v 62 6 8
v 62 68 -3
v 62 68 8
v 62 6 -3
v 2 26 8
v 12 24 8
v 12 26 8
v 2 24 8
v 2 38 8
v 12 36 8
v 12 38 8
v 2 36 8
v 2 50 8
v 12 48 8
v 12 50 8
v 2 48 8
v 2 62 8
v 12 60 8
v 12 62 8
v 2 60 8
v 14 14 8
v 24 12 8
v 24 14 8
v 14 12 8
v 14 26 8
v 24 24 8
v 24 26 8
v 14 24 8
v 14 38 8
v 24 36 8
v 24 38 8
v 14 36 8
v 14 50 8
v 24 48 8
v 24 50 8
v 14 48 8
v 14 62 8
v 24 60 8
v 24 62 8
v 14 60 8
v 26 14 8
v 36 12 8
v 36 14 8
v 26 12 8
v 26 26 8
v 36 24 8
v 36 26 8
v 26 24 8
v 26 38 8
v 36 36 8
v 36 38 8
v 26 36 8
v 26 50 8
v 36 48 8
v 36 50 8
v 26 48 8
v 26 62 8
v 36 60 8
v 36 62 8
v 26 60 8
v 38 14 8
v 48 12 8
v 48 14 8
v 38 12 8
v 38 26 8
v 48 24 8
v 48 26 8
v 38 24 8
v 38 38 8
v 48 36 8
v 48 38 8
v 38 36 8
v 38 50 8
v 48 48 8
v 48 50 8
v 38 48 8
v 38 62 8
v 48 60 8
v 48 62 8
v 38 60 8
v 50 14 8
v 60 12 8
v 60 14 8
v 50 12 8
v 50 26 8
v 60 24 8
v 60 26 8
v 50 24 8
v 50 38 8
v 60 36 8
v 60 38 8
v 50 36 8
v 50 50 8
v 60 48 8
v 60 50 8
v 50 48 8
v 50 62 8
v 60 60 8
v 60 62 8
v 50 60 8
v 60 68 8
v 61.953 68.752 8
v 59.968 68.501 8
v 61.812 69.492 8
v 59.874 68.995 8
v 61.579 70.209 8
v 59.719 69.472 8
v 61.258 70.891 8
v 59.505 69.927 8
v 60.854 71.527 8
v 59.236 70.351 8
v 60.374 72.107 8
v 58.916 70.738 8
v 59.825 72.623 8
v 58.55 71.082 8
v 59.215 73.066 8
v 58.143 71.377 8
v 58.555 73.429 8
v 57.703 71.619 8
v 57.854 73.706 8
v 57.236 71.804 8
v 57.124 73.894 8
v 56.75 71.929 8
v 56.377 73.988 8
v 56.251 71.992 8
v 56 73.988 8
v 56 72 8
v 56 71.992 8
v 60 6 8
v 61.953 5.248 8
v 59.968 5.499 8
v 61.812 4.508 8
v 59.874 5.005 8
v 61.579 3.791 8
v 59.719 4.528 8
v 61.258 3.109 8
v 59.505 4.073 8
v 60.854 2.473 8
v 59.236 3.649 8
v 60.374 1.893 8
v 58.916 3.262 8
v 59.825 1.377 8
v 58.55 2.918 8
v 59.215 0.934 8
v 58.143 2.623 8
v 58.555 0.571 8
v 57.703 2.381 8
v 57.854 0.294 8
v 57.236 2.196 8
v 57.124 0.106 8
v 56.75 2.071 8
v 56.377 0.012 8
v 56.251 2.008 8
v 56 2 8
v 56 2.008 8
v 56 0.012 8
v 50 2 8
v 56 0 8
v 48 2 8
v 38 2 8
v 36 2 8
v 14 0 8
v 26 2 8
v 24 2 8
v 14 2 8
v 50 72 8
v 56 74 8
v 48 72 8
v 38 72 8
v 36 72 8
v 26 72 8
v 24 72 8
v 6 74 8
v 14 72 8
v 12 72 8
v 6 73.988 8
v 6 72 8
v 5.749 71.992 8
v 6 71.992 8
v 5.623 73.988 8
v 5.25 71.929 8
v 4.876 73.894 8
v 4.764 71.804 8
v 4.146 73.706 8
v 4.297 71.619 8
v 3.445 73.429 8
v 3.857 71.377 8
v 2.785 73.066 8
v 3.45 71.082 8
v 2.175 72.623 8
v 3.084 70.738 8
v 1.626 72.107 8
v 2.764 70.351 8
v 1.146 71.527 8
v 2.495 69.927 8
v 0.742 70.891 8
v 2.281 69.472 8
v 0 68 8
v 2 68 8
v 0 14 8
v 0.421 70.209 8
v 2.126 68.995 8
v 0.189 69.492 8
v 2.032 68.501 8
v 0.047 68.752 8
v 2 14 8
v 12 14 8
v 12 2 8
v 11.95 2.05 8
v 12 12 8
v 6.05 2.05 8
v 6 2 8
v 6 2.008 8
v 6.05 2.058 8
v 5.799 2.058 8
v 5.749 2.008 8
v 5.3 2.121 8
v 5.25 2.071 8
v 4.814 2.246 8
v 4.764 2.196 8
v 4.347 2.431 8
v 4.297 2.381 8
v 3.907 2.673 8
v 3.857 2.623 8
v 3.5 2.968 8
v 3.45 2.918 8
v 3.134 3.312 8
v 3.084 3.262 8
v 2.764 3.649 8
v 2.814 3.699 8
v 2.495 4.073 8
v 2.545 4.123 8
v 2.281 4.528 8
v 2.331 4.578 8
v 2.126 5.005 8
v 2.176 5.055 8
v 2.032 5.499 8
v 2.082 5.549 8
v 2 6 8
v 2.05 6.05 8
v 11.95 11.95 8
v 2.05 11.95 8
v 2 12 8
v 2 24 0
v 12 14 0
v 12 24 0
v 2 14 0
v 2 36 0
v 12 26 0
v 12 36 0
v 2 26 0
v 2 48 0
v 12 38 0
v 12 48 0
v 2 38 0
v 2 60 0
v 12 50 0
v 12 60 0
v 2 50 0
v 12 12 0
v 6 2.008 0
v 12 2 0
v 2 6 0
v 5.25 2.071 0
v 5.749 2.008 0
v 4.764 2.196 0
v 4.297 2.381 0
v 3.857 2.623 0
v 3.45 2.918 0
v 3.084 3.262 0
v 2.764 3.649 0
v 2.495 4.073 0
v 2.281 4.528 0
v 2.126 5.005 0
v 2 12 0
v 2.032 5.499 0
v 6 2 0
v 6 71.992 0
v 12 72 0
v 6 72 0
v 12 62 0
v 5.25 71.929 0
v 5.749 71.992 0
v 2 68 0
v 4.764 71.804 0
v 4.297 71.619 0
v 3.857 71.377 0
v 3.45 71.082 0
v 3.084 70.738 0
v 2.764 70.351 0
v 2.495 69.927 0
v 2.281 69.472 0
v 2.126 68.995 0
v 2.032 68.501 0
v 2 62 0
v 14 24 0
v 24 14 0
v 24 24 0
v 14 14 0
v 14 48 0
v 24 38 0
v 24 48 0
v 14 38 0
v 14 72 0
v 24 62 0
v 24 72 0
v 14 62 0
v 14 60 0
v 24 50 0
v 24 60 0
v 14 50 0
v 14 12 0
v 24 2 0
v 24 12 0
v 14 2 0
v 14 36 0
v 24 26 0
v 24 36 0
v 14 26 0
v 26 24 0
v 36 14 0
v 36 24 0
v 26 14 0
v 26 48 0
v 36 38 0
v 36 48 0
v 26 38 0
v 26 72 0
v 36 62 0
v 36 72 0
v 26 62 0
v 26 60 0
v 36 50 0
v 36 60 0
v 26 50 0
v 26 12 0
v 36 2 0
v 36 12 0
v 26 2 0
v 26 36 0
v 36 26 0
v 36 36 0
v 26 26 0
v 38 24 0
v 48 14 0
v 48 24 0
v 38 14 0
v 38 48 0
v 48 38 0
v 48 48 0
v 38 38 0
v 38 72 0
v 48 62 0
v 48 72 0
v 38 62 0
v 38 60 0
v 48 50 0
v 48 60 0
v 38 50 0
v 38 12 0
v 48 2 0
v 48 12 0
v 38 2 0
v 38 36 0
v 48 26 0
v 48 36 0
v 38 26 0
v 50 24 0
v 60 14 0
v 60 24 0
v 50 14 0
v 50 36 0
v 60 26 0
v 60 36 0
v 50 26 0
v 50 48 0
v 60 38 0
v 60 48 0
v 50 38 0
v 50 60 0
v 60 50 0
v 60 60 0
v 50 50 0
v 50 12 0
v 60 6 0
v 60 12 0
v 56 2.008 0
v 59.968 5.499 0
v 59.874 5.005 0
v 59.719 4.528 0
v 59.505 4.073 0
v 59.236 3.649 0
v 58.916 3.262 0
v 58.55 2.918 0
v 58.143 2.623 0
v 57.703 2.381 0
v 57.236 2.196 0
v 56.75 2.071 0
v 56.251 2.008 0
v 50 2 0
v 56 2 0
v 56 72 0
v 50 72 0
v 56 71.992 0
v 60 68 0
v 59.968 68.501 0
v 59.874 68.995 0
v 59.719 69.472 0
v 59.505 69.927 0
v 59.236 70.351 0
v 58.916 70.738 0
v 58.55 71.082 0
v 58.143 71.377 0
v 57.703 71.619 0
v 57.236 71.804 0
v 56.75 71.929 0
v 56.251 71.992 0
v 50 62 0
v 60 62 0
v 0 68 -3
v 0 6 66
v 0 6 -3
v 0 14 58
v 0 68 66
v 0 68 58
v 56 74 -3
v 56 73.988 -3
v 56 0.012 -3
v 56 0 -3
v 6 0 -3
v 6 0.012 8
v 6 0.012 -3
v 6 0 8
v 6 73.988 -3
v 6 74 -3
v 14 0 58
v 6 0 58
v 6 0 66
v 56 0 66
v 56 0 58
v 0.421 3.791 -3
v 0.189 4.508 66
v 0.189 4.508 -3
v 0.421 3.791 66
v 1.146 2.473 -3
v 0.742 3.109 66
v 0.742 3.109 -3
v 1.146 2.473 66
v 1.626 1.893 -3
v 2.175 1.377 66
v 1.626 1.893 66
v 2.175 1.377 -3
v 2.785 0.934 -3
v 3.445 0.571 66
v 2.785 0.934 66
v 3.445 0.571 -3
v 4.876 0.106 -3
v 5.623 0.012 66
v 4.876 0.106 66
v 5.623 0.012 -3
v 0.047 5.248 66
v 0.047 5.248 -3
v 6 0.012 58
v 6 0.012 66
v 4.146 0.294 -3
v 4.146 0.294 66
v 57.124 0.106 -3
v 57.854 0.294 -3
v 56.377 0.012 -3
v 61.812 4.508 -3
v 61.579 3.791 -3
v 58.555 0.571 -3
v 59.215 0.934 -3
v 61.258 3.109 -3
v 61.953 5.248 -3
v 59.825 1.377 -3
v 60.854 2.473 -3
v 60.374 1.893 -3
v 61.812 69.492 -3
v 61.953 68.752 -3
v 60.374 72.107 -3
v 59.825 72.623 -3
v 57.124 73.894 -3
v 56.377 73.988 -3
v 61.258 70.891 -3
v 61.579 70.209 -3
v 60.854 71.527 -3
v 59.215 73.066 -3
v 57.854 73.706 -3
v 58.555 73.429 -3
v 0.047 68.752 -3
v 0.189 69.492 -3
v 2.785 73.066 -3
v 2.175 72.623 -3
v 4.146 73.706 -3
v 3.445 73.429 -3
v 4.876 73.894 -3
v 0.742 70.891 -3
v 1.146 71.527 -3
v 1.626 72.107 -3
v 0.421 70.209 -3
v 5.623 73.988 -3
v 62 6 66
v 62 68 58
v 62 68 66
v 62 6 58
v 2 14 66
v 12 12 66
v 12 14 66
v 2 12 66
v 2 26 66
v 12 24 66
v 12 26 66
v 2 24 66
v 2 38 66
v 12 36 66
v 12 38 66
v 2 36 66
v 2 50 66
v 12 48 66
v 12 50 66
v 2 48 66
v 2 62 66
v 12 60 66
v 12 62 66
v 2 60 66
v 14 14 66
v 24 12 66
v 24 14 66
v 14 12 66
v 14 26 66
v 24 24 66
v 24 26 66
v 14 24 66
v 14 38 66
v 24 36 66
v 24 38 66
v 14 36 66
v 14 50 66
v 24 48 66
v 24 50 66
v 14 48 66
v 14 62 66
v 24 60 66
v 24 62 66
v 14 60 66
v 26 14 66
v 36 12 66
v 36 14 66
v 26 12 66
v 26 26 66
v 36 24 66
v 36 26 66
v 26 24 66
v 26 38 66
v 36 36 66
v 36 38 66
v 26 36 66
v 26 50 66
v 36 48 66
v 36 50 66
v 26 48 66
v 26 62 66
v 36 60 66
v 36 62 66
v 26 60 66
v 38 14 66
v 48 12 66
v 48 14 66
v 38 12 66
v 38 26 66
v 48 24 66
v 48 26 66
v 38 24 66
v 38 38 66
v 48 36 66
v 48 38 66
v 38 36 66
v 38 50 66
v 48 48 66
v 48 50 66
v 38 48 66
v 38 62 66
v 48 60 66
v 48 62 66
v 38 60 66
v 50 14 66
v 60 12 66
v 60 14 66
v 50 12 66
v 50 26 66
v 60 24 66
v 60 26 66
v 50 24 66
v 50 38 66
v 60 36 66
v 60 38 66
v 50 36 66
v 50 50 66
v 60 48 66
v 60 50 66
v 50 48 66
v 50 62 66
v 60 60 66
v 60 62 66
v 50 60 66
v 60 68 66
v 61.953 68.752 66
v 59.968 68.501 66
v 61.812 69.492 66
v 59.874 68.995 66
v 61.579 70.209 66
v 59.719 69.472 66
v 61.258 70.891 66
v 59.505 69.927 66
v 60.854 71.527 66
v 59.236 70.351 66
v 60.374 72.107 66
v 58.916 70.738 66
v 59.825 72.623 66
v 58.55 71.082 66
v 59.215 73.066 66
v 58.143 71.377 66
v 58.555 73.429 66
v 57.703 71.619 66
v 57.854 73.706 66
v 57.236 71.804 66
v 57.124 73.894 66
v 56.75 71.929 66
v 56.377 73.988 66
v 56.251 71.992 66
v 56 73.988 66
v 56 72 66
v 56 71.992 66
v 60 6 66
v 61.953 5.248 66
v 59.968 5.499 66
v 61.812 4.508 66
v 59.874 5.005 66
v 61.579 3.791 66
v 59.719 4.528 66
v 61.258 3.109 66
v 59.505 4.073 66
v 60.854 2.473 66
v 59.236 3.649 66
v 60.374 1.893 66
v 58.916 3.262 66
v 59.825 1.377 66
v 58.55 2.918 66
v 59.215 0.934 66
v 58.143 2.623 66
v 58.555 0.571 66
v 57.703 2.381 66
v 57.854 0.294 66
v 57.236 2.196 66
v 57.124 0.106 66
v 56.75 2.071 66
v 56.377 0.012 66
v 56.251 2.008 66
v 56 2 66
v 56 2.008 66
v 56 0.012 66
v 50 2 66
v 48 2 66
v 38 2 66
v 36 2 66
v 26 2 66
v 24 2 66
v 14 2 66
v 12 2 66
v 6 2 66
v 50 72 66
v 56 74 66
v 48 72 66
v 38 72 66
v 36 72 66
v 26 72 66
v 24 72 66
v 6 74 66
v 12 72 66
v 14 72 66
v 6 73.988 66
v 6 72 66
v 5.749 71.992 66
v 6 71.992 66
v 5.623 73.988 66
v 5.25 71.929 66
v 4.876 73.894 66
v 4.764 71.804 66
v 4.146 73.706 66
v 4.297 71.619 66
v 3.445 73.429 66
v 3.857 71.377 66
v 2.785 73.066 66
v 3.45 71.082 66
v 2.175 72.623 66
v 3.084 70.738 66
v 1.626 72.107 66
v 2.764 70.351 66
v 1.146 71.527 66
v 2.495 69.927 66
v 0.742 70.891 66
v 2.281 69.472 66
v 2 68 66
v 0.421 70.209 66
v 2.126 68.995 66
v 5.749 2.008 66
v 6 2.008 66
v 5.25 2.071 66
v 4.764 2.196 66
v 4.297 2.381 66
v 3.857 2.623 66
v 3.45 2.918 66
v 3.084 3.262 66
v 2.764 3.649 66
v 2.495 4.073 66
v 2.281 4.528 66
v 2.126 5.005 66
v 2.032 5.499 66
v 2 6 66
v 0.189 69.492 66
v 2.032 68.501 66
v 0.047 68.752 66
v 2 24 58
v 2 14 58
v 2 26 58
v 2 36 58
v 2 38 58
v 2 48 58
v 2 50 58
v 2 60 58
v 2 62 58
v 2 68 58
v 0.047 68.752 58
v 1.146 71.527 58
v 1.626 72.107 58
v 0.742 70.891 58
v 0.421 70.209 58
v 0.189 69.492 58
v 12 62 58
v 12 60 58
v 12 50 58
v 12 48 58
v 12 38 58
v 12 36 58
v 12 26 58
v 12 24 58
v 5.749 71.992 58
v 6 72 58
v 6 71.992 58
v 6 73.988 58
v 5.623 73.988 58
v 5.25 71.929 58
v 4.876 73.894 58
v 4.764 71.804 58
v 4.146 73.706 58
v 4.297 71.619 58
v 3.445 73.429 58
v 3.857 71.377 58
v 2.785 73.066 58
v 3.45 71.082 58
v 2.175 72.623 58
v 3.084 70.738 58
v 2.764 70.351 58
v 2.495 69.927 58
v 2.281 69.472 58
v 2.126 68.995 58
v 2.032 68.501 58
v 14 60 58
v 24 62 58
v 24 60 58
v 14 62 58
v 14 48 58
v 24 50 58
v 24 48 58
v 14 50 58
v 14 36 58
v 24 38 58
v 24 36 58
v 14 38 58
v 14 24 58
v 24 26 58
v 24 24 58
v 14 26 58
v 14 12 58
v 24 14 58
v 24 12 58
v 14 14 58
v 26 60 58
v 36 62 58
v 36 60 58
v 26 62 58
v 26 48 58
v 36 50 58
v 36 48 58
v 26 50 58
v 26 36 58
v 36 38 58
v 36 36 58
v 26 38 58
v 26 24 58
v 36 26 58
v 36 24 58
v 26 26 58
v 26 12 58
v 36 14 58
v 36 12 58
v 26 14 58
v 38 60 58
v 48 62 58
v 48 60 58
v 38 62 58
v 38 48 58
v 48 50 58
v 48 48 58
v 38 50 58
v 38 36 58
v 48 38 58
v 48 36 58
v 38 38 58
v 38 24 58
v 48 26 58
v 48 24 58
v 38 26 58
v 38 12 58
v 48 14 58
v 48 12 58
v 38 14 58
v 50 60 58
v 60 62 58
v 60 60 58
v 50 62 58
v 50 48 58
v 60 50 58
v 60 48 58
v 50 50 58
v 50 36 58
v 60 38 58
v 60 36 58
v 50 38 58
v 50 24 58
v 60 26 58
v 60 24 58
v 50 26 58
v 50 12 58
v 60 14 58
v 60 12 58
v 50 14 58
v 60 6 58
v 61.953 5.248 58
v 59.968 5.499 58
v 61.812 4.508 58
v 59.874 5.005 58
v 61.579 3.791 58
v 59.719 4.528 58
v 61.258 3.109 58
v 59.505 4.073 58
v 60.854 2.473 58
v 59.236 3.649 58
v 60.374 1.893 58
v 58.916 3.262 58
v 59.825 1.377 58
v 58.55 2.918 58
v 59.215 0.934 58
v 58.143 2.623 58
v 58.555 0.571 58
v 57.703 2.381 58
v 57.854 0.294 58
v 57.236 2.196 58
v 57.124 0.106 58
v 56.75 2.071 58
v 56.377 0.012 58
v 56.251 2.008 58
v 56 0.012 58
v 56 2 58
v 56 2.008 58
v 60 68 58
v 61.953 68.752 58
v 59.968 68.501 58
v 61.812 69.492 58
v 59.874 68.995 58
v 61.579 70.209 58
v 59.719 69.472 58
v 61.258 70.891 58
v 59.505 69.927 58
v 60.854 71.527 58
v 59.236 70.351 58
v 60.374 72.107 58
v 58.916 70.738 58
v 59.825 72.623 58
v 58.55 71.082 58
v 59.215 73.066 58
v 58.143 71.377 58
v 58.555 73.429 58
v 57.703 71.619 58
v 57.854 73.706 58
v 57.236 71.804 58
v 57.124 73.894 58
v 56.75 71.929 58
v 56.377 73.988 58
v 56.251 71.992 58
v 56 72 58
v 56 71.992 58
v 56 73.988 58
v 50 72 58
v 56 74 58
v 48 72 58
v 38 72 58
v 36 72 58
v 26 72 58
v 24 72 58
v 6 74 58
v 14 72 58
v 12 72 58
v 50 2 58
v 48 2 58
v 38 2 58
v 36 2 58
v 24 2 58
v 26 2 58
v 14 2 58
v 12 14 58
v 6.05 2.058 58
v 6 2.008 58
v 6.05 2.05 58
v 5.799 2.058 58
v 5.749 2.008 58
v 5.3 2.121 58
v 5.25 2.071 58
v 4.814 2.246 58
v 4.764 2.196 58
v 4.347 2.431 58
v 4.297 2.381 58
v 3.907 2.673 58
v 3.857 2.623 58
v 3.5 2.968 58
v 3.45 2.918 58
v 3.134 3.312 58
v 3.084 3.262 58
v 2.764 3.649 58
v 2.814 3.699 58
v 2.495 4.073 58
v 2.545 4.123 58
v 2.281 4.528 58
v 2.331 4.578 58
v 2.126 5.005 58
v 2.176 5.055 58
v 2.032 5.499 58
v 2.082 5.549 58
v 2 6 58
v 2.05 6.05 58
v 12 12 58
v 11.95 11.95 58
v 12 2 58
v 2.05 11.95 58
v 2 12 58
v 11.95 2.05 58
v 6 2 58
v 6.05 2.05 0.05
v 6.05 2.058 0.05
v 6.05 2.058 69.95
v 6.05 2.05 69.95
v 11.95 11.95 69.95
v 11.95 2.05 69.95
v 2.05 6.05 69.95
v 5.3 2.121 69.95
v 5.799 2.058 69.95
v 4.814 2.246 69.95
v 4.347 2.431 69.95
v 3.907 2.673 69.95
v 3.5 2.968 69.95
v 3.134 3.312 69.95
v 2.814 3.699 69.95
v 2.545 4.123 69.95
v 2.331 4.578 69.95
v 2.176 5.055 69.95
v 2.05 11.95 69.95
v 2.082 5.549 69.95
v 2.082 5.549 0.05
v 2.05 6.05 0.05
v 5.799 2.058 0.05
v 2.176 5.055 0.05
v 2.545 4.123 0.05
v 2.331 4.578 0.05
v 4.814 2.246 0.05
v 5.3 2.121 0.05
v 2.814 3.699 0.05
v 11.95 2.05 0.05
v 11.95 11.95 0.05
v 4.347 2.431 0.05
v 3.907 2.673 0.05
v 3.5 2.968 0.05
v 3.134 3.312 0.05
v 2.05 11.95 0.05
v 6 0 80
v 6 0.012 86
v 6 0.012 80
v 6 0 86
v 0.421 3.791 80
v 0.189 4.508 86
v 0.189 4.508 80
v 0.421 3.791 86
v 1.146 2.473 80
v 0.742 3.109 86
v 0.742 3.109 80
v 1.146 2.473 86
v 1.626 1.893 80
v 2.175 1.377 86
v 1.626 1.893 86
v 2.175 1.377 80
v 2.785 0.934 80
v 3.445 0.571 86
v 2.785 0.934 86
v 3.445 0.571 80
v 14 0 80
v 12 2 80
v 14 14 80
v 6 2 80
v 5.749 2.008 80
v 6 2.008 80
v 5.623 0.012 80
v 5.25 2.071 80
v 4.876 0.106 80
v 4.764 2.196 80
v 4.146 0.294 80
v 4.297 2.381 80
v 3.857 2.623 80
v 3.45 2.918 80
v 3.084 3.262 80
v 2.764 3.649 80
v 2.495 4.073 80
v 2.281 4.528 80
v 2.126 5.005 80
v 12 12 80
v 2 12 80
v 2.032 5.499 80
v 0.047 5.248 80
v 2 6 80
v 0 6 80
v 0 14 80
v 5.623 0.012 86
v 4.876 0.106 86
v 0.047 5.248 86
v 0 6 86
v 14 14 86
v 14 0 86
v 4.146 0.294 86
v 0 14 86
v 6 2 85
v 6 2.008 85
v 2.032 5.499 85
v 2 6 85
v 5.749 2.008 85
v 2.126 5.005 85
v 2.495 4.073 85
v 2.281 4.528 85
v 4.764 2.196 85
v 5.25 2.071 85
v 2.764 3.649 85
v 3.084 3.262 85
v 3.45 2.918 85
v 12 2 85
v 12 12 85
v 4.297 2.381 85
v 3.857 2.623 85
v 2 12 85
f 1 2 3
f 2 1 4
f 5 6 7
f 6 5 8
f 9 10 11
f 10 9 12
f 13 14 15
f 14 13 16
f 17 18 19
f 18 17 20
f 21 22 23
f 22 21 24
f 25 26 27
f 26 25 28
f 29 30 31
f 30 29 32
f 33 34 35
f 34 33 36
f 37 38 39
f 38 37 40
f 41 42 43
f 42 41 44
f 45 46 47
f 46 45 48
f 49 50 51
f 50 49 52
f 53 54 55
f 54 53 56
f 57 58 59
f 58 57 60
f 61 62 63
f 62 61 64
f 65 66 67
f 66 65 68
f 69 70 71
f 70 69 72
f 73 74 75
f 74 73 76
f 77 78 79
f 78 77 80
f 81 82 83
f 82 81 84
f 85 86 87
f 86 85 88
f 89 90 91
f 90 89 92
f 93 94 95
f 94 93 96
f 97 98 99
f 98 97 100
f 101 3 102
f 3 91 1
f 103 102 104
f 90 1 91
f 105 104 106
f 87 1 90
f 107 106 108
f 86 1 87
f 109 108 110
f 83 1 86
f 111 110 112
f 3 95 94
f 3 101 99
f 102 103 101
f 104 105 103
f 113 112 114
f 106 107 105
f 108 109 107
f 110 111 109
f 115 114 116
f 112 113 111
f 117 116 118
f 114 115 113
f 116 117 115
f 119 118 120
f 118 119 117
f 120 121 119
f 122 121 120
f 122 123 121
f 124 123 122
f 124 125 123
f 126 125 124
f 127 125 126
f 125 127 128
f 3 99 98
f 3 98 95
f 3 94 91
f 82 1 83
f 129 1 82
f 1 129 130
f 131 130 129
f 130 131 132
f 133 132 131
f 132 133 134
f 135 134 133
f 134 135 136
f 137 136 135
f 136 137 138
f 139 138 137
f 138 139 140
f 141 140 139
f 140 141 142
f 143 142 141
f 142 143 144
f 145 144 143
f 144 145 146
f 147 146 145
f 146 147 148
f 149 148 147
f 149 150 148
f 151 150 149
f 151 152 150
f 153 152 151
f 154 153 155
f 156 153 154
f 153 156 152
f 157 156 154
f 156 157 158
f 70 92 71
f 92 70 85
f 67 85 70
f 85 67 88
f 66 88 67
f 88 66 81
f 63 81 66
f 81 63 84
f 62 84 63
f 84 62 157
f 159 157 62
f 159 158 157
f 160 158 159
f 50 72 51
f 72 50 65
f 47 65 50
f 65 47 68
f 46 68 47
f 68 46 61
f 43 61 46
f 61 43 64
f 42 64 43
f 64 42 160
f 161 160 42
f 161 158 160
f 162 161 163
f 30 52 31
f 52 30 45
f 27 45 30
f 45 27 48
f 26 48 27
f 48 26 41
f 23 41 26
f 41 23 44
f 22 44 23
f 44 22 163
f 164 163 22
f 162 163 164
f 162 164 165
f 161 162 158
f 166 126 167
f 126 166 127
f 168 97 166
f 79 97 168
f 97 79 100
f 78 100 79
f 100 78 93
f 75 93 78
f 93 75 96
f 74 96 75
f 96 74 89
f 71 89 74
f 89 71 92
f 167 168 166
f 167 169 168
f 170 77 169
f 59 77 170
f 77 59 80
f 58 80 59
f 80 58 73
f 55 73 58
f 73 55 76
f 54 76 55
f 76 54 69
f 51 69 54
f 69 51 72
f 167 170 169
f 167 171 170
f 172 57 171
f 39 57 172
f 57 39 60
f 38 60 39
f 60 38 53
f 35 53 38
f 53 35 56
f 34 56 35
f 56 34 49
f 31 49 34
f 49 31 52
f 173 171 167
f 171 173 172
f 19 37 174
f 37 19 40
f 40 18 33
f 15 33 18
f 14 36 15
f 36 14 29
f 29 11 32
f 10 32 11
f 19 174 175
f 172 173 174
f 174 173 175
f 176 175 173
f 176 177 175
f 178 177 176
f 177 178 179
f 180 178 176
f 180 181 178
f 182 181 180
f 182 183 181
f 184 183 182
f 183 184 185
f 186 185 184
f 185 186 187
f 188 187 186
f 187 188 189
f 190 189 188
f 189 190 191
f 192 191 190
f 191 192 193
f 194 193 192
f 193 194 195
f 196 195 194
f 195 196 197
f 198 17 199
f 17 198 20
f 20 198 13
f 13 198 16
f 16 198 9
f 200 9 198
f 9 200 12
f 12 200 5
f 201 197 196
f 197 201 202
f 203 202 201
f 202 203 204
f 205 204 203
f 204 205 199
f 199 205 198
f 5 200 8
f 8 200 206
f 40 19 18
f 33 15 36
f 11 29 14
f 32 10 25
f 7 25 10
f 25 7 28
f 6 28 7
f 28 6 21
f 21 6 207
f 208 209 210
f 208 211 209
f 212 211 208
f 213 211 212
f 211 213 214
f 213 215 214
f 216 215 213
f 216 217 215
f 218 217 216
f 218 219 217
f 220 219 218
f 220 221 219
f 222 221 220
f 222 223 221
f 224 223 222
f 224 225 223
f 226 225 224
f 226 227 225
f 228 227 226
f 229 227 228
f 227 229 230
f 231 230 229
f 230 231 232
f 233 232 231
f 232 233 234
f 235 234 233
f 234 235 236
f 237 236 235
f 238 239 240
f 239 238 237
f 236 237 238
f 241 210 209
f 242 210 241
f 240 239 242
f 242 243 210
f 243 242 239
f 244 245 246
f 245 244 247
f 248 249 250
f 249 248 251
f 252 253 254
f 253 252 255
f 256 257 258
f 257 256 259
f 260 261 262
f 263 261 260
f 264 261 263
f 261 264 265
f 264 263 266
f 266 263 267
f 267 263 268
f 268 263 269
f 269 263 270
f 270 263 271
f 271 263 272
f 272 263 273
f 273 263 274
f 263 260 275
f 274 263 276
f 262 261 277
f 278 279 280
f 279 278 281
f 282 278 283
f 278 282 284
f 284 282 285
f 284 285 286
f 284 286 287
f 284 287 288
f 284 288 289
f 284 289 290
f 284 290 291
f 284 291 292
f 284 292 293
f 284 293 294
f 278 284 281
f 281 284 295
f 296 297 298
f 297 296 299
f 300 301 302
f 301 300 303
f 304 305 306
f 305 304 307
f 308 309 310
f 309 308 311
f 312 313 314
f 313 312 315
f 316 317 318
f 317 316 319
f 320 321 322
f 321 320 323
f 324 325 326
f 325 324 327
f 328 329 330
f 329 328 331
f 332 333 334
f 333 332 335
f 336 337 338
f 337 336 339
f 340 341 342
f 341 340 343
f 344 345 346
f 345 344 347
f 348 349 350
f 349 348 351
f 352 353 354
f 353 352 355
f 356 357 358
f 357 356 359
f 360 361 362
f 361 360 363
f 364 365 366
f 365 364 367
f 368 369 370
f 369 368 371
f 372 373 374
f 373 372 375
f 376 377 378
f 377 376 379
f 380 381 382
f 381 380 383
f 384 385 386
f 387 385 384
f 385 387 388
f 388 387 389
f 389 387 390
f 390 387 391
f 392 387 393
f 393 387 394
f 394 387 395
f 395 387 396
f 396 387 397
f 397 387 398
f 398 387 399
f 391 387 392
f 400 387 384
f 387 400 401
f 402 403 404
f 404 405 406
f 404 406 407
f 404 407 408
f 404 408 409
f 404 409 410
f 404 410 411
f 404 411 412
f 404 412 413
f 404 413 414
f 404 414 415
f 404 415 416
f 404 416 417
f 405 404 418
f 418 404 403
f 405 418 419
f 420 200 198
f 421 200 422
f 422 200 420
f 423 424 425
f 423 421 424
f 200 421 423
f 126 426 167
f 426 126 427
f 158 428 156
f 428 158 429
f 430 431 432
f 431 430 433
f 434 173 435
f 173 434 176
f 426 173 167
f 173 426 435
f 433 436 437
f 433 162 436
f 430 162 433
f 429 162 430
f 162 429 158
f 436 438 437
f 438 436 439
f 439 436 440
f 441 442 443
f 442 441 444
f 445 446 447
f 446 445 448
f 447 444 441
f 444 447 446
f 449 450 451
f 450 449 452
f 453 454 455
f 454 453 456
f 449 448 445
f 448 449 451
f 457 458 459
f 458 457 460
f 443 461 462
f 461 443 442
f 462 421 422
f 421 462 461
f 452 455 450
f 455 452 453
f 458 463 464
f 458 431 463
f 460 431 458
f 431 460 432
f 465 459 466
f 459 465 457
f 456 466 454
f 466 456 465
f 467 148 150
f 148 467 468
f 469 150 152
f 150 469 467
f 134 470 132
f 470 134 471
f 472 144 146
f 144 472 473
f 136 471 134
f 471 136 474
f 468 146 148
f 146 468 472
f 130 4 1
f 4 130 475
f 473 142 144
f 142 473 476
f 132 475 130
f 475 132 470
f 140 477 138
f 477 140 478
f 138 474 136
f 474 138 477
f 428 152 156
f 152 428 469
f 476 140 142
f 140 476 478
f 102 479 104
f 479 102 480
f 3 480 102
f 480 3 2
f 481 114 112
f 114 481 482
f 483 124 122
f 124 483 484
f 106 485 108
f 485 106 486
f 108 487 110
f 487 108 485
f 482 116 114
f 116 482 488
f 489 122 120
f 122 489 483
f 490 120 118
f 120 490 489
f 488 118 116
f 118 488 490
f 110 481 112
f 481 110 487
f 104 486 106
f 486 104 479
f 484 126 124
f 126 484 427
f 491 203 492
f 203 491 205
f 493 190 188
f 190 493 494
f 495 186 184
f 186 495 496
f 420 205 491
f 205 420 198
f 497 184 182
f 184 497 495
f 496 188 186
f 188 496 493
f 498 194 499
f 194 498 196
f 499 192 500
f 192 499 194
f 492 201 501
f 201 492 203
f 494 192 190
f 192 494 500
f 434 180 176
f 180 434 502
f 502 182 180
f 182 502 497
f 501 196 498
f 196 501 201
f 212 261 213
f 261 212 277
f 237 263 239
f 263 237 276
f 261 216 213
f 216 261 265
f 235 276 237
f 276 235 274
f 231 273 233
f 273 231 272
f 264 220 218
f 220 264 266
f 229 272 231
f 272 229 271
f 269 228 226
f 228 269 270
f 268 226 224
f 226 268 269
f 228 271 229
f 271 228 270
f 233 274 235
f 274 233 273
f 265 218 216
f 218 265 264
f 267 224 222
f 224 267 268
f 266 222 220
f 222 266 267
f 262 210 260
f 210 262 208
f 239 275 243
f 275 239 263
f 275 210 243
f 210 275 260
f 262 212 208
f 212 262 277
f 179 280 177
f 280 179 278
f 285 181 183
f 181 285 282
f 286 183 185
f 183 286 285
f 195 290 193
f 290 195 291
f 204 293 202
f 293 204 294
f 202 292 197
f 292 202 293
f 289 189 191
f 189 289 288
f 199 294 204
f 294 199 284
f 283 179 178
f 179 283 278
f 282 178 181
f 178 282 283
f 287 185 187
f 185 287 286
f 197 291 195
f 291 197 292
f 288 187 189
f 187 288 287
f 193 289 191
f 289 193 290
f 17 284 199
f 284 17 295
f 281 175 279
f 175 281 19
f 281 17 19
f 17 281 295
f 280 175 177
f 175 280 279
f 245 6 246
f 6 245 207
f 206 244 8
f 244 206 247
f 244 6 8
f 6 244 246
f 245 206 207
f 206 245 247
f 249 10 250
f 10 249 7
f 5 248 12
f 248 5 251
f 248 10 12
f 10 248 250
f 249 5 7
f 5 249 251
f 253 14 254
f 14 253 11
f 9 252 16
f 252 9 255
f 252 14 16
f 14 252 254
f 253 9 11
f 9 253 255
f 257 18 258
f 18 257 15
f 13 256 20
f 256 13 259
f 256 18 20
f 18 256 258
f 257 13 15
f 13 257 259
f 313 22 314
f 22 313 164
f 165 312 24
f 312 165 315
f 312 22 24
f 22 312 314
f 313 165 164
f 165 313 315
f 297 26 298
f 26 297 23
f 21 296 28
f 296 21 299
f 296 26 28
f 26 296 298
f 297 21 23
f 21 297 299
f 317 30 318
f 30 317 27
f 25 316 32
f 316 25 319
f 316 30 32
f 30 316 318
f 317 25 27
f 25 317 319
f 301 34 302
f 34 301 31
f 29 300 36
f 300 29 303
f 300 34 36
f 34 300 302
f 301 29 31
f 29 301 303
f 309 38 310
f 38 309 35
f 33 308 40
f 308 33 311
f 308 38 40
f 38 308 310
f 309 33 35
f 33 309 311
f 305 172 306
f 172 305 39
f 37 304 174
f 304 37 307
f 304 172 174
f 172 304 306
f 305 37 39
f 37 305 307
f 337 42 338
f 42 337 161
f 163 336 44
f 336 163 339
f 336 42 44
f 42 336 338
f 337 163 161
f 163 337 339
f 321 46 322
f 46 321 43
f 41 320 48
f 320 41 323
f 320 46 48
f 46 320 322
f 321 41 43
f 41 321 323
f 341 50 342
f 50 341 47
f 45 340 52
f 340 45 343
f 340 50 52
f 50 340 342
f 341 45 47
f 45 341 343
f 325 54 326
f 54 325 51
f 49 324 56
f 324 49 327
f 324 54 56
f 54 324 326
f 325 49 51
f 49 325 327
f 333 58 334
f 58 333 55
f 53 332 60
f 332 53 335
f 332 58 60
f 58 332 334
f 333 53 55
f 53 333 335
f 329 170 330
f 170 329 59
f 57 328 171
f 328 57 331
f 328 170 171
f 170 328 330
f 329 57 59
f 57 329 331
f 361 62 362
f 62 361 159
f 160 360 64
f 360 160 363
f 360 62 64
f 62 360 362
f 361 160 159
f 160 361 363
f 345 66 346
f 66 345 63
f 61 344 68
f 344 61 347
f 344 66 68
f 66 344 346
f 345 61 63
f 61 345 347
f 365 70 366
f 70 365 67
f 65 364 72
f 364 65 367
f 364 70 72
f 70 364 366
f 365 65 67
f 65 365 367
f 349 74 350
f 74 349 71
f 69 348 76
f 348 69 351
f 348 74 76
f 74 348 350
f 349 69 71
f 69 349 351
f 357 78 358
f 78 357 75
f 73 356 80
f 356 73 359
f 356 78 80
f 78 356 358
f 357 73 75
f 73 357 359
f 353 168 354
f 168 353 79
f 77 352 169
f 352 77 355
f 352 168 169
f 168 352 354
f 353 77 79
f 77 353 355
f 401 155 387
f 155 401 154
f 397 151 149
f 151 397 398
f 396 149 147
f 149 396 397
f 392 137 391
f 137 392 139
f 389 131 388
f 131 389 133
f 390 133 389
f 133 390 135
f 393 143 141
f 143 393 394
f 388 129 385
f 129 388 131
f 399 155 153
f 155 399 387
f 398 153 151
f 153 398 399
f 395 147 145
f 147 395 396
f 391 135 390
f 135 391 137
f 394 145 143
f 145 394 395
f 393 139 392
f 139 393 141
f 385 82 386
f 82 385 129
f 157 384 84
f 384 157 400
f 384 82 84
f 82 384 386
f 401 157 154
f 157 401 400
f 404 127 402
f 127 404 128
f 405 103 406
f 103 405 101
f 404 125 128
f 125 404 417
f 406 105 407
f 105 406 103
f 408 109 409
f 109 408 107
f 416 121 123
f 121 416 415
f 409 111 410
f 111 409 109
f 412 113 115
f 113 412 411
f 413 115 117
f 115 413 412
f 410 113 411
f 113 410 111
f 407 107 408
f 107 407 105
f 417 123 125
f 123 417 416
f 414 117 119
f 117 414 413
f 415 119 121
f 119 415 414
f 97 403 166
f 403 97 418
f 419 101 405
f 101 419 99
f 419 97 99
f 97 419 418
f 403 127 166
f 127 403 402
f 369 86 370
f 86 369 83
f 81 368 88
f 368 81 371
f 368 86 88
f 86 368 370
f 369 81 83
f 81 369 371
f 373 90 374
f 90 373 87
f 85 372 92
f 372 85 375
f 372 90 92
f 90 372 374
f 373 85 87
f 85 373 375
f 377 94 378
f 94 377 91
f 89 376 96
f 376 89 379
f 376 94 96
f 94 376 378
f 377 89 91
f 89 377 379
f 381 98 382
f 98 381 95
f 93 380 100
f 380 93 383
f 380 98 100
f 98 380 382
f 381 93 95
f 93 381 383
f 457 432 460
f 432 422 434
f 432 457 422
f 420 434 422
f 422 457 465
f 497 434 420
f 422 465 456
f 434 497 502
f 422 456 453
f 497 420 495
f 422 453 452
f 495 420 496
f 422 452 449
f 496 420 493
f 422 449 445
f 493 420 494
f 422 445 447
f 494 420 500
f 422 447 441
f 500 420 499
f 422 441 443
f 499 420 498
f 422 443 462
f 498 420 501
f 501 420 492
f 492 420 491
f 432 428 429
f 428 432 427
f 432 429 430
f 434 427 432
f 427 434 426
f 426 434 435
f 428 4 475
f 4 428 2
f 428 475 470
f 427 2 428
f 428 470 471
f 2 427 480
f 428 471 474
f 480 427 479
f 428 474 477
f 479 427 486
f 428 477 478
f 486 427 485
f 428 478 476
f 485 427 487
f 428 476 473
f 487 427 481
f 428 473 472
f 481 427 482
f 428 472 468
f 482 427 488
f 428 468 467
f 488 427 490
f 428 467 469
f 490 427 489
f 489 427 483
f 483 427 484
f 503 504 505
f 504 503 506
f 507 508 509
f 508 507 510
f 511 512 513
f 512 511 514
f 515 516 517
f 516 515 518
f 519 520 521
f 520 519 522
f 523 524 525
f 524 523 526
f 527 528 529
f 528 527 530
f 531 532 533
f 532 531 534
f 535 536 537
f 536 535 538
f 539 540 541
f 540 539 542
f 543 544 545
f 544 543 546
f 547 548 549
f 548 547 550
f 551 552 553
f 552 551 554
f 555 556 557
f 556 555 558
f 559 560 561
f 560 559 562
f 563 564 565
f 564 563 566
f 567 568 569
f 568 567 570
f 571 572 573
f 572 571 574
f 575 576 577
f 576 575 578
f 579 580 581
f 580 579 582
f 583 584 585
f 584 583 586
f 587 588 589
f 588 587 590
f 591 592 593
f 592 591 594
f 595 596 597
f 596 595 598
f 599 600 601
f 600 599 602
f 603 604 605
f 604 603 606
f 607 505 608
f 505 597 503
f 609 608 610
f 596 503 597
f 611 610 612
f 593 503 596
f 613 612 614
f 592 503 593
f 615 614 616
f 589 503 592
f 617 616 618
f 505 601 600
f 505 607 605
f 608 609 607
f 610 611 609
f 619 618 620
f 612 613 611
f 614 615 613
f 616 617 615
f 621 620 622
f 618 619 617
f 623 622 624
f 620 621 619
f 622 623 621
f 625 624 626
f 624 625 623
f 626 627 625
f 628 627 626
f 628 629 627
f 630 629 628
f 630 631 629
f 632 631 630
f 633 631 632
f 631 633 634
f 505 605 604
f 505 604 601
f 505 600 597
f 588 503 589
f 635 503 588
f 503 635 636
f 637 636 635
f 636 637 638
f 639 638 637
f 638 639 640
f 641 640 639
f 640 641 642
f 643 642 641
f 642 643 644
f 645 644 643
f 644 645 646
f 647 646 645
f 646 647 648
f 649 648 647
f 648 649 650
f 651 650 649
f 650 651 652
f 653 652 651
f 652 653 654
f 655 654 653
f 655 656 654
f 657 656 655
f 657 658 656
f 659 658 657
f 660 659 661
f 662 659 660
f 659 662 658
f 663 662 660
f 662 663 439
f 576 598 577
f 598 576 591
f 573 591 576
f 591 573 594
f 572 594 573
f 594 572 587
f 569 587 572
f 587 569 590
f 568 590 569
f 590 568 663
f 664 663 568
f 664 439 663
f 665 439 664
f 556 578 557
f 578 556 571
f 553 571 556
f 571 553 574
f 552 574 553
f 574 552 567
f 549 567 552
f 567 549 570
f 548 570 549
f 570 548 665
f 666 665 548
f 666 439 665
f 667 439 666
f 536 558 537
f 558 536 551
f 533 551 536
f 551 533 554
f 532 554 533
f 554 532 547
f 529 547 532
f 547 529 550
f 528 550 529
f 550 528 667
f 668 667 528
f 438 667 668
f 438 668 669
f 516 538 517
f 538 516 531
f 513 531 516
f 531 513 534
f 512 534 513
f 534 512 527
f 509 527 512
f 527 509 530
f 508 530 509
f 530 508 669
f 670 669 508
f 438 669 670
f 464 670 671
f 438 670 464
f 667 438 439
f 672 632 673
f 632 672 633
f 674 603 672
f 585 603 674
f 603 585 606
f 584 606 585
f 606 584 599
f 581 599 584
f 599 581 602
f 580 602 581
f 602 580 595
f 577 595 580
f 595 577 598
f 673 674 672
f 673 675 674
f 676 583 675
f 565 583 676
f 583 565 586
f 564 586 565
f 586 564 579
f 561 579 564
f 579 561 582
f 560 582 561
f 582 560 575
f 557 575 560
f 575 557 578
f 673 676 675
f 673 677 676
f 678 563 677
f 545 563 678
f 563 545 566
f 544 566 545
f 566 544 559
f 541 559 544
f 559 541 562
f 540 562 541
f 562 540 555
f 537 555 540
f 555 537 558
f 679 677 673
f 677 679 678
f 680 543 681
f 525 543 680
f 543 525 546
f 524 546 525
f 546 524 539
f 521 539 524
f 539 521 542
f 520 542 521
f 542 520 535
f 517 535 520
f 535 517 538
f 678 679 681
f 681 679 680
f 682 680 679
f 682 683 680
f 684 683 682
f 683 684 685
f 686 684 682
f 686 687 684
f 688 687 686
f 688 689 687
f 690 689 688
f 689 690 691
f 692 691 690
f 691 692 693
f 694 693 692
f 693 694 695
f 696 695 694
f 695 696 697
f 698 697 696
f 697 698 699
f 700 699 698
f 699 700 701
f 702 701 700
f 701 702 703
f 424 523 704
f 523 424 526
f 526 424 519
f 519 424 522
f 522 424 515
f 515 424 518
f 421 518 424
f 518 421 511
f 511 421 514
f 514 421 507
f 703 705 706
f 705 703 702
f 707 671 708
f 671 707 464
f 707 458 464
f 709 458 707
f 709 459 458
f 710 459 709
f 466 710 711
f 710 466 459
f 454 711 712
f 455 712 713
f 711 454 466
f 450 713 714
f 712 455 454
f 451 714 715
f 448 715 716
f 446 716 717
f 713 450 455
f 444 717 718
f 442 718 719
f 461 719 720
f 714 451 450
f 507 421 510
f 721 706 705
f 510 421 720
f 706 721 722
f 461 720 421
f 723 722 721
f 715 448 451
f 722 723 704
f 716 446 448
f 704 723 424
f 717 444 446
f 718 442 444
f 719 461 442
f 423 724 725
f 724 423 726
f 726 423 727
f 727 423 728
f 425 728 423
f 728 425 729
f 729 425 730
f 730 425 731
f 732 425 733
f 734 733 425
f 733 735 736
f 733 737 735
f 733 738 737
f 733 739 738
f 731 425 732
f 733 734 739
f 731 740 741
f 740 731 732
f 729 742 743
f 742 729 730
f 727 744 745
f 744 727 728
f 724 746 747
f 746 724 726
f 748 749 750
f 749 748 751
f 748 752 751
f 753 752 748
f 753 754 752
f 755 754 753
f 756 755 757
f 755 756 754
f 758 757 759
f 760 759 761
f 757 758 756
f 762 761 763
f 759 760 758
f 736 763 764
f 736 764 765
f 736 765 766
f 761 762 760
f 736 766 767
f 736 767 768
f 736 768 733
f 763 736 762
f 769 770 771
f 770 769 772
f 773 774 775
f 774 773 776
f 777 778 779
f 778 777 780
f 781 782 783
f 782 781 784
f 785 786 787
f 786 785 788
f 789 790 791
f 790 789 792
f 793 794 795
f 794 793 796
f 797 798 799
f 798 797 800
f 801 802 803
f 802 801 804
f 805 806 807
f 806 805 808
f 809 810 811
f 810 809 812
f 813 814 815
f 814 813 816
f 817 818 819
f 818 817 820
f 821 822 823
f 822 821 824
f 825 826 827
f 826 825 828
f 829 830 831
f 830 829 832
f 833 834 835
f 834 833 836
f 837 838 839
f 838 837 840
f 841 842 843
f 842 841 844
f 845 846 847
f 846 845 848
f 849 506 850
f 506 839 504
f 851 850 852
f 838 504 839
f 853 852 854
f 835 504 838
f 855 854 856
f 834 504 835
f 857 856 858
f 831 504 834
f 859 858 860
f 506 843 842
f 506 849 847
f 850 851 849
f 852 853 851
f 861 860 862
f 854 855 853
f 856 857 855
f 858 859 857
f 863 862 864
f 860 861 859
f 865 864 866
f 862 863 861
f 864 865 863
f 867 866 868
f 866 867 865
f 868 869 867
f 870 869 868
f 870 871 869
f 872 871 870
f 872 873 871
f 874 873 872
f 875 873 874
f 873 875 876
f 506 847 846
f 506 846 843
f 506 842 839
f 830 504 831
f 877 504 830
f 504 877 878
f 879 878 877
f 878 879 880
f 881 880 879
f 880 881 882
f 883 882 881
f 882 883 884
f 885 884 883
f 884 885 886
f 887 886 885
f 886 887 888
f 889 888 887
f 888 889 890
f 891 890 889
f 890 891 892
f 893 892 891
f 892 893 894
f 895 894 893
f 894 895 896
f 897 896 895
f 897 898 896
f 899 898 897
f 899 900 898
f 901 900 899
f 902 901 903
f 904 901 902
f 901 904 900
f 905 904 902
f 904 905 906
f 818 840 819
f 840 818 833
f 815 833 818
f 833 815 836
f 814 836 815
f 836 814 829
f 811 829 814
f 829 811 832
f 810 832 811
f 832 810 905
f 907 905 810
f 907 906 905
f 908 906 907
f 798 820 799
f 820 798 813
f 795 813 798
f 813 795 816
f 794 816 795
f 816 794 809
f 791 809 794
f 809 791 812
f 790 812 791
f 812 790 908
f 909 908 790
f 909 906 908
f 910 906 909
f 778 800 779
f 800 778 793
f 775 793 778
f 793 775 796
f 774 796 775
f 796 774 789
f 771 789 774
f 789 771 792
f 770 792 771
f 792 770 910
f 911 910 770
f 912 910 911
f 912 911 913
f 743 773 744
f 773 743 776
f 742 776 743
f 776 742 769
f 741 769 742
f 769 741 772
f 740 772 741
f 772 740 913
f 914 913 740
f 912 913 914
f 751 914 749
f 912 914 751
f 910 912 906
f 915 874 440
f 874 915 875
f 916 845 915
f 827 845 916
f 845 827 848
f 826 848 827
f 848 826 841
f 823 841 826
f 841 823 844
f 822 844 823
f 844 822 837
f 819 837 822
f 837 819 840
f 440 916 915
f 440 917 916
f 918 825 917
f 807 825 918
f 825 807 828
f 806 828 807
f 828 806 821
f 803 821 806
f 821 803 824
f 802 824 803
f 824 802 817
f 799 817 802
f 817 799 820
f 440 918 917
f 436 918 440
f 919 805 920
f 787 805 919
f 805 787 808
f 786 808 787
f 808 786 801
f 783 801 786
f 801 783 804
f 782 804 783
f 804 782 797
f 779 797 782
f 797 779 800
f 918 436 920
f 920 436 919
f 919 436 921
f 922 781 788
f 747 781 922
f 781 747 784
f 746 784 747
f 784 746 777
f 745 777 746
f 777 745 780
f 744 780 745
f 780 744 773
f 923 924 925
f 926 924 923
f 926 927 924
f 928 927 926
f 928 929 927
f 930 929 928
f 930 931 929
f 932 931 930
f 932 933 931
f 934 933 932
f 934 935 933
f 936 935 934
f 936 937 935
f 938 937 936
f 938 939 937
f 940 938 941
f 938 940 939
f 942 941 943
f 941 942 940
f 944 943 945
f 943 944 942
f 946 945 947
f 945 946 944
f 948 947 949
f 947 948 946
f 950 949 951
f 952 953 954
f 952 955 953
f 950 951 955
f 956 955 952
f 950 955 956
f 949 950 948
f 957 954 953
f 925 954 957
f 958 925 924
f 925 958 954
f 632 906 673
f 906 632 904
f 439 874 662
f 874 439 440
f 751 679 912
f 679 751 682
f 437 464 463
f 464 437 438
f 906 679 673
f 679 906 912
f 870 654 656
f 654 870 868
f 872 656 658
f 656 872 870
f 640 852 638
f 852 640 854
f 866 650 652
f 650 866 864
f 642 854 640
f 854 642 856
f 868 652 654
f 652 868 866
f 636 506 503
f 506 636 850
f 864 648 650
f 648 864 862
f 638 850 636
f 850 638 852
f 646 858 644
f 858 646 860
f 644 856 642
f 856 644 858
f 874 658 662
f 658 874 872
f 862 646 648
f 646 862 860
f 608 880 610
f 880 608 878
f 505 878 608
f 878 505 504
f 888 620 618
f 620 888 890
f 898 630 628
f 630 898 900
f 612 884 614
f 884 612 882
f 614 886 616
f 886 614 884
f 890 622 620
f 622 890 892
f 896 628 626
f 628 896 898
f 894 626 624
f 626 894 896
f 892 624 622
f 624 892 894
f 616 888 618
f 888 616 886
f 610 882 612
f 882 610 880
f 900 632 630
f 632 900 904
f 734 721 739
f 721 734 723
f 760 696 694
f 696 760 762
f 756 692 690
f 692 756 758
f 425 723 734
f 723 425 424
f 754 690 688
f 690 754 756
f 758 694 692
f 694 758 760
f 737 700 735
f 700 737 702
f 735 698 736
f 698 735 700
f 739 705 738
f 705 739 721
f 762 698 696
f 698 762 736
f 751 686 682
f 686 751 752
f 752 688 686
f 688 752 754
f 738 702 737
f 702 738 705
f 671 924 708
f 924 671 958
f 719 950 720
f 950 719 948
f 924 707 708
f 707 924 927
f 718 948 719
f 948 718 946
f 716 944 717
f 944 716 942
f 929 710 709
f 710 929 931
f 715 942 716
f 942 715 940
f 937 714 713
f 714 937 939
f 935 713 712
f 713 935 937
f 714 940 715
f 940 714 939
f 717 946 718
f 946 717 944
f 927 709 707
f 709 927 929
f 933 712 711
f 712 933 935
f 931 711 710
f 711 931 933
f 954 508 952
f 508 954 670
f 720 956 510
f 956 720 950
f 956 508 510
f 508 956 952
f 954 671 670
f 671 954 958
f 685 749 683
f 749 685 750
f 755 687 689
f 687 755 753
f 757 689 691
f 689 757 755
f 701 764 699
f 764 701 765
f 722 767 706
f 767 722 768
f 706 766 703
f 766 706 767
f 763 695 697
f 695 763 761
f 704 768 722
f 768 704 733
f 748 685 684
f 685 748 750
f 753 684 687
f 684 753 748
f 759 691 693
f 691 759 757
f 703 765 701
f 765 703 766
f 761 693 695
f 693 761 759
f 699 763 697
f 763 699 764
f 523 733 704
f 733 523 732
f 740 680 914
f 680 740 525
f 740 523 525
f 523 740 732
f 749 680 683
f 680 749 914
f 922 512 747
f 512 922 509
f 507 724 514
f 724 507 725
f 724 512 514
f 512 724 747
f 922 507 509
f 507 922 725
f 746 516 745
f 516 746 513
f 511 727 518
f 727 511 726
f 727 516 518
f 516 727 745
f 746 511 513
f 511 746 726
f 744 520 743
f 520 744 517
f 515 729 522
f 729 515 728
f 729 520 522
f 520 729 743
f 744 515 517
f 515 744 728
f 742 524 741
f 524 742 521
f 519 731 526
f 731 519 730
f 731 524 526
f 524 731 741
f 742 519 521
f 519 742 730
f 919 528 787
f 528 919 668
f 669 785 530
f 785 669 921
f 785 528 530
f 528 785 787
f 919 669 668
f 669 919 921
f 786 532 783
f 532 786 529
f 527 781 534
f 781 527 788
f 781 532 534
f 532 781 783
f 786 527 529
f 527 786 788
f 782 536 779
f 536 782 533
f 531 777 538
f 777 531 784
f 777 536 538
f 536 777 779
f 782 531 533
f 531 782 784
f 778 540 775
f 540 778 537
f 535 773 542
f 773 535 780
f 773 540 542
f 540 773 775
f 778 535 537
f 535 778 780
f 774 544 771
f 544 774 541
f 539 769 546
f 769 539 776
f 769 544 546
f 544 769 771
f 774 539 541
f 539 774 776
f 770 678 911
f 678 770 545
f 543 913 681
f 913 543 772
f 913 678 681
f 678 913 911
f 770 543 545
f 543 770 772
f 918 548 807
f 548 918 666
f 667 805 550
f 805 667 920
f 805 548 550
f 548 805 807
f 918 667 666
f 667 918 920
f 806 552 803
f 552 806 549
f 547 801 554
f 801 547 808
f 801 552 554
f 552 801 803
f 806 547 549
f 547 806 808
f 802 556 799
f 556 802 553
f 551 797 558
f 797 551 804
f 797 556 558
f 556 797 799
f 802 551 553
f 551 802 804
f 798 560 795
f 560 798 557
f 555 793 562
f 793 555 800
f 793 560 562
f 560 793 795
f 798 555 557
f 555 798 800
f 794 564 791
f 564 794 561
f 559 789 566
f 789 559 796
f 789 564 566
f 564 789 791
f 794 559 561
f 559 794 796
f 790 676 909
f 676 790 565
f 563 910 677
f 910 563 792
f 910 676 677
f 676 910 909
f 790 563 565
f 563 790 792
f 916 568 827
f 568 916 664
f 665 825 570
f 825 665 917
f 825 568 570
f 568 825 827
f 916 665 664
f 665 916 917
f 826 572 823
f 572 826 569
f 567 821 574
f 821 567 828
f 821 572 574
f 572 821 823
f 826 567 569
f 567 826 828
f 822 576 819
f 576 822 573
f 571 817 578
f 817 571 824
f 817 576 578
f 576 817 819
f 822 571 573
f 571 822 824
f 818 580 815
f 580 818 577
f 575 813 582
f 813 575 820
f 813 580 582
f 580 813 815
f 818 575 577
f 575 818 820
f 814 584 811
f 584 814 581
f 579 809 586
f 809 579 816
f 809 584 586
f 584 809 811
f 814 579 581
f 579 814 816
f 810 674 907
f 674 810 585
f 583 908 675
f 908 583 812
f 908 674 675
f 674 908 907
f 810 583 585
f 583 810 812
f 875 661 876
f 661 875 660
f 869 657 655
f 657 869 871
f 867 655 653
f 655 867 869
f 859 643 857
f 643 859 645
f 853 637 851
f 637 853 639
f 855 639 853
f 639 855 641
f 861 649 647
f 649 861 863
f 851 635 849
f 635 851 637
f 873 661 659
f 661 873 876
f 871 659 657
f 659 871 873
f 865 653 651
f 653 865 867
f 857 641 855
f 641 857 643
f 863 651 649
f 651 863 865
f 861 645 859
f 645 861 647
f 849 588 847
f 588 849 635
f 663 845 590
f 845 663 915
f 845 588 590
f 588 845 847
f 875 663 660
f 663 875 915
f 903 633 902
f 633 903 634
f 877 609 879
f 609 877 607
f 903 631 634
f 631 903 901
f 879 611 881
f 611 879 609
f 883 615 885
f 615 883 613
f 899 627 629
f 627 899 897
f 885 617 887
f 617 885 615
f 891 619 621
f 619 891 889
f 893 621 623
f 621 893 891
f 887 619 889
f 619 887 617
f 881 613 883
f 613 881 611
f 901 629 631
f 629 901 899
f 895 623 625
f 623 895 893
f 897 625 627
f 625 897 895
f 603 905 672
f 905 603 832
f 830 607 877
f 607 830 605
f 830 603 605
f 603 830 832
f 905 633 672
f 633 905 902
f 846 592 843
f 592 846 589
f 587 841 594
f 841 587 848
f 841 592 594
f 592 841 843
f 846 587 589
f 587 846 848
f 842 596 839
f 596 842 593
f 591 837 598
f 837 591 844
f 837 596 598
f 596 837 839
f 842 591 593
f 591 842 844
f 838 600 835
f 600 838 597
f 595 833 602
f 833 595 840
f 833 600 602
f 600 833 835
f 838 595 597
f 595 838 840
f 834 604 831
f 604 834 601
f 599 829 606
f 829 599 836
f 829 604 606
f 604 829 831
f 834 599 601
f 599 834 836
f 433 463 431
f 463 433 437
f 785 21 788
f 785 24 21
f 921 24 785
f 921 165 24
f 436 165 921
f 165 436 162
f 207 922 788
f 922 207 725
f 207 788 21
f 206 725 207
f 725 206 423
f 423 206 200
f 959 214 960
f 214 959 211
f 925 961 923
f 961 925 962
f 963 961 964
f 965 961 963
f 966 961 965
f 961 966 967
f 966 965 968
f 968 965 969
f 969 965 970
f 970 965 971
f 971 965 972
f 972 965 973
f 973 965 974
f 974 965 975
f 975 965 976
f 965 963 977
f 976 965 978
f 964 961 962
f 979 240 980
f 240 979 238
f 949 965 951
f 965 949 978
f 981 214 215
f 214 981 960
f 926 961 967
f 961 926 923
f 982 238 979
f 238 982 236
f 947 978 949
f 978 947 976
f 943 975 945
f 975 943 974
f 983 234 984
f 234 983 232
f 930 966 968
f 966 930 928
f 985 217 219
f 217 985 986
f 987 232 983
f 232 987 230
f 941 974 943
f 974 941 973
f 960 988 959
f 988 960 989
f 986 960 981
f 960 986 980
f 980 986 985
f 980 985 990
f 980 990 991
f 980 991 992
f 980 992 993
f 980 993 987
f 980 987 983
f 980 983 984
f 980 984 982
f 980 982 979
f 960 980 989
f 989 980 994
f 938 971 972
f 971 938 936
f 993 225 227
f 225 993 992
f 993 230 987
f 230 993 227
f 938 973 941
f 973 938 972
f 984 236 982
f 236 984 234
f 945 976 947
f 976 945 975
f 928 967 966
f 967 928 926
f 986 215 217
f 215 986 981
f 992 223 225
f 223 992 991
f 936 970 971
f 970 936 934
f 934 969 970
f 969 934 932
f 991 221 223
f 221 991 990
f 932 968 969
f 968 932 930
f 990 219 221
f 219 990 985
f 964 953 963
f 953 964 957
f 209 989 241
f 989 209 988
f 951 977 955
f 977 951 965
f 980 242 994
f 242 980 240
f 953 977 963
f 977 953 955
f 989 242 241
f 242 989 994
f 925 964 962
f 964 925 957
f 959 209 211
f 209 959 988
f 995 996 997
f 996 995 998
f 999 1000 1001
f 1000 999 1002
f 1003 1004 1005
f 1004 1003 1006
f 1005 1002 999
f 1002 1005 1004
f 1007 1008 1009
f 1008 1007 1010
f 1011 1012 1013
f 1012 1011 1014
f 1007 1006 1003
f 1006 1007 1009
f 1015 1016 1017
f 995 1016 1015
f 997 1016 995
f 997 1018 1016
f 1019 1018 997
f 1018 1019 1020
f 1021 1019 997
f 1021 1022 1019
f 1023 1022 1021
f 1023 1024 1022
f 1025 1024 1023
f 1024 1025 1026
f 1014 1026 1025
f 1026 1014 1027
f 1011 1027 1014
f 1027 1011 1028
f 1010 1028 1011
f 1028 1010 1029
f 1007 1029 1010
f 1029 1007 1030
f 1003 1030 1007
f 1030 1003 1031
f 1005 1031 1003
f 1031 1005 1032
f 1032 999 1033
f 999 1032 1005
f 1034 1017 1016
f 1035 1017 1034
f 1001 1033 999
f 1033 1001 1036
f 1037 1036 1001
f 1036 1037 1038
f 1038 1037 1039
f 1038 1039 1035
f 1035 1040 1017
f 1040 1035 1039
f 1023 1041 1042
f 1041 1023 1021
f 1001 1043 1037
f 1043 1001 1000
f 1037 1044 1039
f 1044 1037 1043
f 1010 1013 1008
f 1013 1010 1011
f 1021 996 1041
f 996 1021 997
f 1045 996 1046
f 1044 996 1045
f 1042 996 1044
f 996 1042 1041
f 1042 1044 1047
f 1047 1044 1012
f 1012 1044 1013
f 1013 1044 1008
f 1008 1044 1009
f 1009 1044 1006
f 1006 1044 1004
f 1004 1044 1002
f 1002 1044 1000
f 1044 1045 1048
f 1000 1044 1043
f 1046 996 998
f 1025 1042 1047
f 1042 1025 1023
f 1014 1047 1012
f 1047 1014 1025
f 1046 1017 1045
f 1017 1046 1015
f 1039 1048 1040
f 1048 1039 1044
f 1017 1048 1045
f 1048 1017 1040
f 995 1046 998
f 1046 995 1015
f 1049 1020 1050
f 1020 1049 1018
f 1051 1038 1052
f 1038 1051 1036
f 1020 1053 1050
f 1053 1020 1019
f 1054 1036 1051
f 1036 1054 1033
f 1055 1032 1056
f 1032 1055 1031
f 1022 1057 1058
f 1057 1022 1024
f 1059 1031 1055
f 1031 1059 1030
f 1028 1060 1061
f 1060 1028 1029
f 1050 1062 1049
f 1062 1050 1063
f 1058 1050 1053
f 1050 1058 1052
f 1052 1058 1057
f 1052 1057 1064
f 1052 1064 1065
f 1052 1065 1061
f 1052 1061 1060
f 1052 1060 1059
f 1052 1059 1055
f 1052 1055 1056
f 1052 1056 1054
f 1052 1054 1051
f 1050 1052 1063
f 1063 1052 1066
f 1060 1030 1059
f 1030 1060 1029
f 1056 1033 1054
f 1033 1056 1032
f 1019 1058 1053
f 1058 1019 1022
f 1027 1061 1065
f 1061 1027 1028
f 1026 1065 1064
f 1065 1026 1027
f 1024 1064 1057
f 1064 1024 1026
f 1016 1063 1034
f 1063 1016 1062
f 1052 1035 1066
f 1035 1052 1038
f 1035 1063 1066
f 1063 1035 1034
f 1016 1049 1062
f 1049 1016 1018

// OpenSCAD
// Brush holder
//
// ===================================================
// This is a remix of the Cubistand Pen Brush Holder Stand
// by sdmc
//
// ===================================================


// preview[view:south, tilt:top]

/* [Parameters] */

// Which part would you like to see?
part = "fullset"; // [base:Base only,top:Top only,rod:Connecting rod,cap: Connecting rod cap, fullset:Full set of parts]

// Paintbrush hole width.
hole_w = 10; 

// Paintbrush hole length.
hole_d = 10;

// Wall thickness. 
wall_thickness = 2; 

// Holder base and top height
holder_h = 8; 

//Rod height (excludes the part that goes into the base and top)
rod_h = 50; 

// Number of holes width
holes_count_w = 5;

// Number of holes depth
holes_count_d = 6;

// Rounding. This is the rounding at the corners of the base and top.
rounding = 6; 

// Bottom Thickness. 
bottom_h = 3; //[1,2,3,4,5]

// Rod play. This shrinks the ends of the rod by a smidge so they can be inserted into the printed base and top.
rod_play = 0.05; // [0,0.05, 0.1, 0.2]

// Cap height. Zero means no cap.
cap_h = 6; 

/*[Hidden]*/
full_width = holes_count_w * (hole_w + wall_thickness) + wall_thickness;
full_depth = holes_count_d * (hole_d + wall_thickness) + wall_thickness;
$fn = 50;


inner_rounding = rounding - wall_thickness;
if ( inner_rounding < 0 ) {
    inner_rounding = 0;
}

print_part();

module print_part() {
    if (part=="base") {
        part_base();
    }
    else if (part == "top") {
        part_main();
    }
    else if (part == "cap") {
        part_cap();
    }
    else if (part == "rod") {
        part_rod();
    }
    else if (part=="fullset") {
        part_fullset();
    }
}

module part_fullset() {
    part_base();
    part_main();   
    part_rod();
    part_cap();
}

module part_cap() {
    if ( cap_h > 0 ) {
         translate([0,0,rod_h+30]) {
            difference() {
                onecorner_rounded_rectangle(hole_w+2*wall_thickness, hole_d+2*wall_thickness, cap_h, rounding);
                translate([wall_thickness,wall_thickness,-1]) 
                onecorner_rounded_rectangle(hole_w, hole_d, cap_h - wall_thickness+2, inner_rounding);
            }
        }
    }
}

module part_rod() {
    union() {
        translate([0,0,holder_h]) 
            onecorner_rounded_rectangle(hole_w+2*wall_thickness, hole_d+2*wall_thickness, rod_h, rounding);
        
        o = sign(cap_h) * (cap_h - wall_thickness);
        
        translate([wall_thickness+rod_play,wall_thickness+rod_play,rod_play]) 
            onecorner_rounded_rectangle(hole_w-rod_play*2, 
                    hole_d-rod_play*2, 
                    rod_h+(2*holder_h)-rod_play*2 + o, 
                    inner_rounding);
    }
}

module part_base() {
    union() {
        holed_rectangle();
        translate([0,0,-bottom_h]) {
            rounded_rectangle(bottom_h);
        }
    }
}

module part_main() {
    translate([0,0,rod_h+holder_h]) {
        holed_rectangle();
    }
}

module holed_rectangle() {
    difference() {
        rounded_rectangle(holder_h);
        for( x=[0:holes_count_w-1]) {
             for( y =[0:holes_count_d-1] ) {
                translate(
                    [wall_thickness+ (hole_w + wall_thickness) * x ,
                     wall_thickness+ (hole_d + wall_thickness) * y,
                     -1]) {
                         if ( (x == 0 && y == 0)) {
                             onecorner_rounded_rectangle( hole_w, hole_d, holder_h+2, inner_rounding);
                         } 
                         else if ( x==0 && y == (holes_count_d -1)) {
                             rotated_rounded_hole(180, true);
                         }                         
                         else if ( x== (holes_count_w -1) && y == (holes_count_d -1)) {
                             rotated_rounded_hole(180, false);
                         }                         
                         else if ( x==(holes_count_w -1) && y == 0) {
                             rotated_rounded_hole(0, true);
                         }                         
                         else                          
                         {
                             onecorner_rounded_rectangle( hole_w, hole_d, holder_h+2,0);
                         }
                }
             }
        }
    }
}

module rotated_rounded_hole(deg, which_corner) {
     translate([hole_w/2, hole_d/2,0]) {
         rotate([0,0,deg]) {
             translate([-hole_w/2, -hole_d/2,0]) {
                 if ( !which_corner) 
                     onecorner_rounded_rectangle( hole_w, hole_d, holder_h+2, inner_rounding, 0);                 
                 else 
                     onecorner_rounded_rectangle( hole_w, hole_d, holder_h+2, 0, inner_rounding);
             }
         }                             
    }
}

module onecorner_rounded_rectangle(w, d, h, r, r1) {    
    difference() {
        cube([w, d, h], false);
        if ( r > 0 ) {
            round_corner(r,h);
        }
        if ( r1 > 0 ) {
            other_round_corner(r1, w, h);
        }
    }
}

module round_corner(r, h) {
    p=1;      
    difference () {
        translate([-p,-p,-p]) { 
            cube( [r+p,r+p,h+p*2] , false);
        }
        translate([r, r, 0]) {
            cylinder(h,r,r);
        }
    }
}

module other_round_corner(r,w,h) {
    p=1;      
    difference () {
        translate([w-r,-p,-p]) { 
            cube( [r+p,r+p,h+p*2] , false);
        }
        translate([w-r, r, 0]) {
            cylinder(h,r,r);
        }
    }
}

module rounded_rectangle(h) {
    union() {
        translate([0,rounding,0]) {
            cube([full_width,full_depth - (rounding * 2),h], false);
        }
        translate([rounding,0,0]) {
            cube([full_width - (rounding * 2), full_depth ,h], false);
        }
        translate([rounding,rounding,0]) {
            cylinder(h, rounding, rounding);
        }
        translate([full_width - rounding,rounding,0]) {
            cylinder(h, rounding, rounding);
        }
        translate([full_width - rounding,full_depth - rounding,0]) {
            cylinder(h, rounding, rounding);
        }
        translate([rounding,full_depth - rounding,0]) {
            cylinder(h, rounding, rounding);
        }
    }
}
